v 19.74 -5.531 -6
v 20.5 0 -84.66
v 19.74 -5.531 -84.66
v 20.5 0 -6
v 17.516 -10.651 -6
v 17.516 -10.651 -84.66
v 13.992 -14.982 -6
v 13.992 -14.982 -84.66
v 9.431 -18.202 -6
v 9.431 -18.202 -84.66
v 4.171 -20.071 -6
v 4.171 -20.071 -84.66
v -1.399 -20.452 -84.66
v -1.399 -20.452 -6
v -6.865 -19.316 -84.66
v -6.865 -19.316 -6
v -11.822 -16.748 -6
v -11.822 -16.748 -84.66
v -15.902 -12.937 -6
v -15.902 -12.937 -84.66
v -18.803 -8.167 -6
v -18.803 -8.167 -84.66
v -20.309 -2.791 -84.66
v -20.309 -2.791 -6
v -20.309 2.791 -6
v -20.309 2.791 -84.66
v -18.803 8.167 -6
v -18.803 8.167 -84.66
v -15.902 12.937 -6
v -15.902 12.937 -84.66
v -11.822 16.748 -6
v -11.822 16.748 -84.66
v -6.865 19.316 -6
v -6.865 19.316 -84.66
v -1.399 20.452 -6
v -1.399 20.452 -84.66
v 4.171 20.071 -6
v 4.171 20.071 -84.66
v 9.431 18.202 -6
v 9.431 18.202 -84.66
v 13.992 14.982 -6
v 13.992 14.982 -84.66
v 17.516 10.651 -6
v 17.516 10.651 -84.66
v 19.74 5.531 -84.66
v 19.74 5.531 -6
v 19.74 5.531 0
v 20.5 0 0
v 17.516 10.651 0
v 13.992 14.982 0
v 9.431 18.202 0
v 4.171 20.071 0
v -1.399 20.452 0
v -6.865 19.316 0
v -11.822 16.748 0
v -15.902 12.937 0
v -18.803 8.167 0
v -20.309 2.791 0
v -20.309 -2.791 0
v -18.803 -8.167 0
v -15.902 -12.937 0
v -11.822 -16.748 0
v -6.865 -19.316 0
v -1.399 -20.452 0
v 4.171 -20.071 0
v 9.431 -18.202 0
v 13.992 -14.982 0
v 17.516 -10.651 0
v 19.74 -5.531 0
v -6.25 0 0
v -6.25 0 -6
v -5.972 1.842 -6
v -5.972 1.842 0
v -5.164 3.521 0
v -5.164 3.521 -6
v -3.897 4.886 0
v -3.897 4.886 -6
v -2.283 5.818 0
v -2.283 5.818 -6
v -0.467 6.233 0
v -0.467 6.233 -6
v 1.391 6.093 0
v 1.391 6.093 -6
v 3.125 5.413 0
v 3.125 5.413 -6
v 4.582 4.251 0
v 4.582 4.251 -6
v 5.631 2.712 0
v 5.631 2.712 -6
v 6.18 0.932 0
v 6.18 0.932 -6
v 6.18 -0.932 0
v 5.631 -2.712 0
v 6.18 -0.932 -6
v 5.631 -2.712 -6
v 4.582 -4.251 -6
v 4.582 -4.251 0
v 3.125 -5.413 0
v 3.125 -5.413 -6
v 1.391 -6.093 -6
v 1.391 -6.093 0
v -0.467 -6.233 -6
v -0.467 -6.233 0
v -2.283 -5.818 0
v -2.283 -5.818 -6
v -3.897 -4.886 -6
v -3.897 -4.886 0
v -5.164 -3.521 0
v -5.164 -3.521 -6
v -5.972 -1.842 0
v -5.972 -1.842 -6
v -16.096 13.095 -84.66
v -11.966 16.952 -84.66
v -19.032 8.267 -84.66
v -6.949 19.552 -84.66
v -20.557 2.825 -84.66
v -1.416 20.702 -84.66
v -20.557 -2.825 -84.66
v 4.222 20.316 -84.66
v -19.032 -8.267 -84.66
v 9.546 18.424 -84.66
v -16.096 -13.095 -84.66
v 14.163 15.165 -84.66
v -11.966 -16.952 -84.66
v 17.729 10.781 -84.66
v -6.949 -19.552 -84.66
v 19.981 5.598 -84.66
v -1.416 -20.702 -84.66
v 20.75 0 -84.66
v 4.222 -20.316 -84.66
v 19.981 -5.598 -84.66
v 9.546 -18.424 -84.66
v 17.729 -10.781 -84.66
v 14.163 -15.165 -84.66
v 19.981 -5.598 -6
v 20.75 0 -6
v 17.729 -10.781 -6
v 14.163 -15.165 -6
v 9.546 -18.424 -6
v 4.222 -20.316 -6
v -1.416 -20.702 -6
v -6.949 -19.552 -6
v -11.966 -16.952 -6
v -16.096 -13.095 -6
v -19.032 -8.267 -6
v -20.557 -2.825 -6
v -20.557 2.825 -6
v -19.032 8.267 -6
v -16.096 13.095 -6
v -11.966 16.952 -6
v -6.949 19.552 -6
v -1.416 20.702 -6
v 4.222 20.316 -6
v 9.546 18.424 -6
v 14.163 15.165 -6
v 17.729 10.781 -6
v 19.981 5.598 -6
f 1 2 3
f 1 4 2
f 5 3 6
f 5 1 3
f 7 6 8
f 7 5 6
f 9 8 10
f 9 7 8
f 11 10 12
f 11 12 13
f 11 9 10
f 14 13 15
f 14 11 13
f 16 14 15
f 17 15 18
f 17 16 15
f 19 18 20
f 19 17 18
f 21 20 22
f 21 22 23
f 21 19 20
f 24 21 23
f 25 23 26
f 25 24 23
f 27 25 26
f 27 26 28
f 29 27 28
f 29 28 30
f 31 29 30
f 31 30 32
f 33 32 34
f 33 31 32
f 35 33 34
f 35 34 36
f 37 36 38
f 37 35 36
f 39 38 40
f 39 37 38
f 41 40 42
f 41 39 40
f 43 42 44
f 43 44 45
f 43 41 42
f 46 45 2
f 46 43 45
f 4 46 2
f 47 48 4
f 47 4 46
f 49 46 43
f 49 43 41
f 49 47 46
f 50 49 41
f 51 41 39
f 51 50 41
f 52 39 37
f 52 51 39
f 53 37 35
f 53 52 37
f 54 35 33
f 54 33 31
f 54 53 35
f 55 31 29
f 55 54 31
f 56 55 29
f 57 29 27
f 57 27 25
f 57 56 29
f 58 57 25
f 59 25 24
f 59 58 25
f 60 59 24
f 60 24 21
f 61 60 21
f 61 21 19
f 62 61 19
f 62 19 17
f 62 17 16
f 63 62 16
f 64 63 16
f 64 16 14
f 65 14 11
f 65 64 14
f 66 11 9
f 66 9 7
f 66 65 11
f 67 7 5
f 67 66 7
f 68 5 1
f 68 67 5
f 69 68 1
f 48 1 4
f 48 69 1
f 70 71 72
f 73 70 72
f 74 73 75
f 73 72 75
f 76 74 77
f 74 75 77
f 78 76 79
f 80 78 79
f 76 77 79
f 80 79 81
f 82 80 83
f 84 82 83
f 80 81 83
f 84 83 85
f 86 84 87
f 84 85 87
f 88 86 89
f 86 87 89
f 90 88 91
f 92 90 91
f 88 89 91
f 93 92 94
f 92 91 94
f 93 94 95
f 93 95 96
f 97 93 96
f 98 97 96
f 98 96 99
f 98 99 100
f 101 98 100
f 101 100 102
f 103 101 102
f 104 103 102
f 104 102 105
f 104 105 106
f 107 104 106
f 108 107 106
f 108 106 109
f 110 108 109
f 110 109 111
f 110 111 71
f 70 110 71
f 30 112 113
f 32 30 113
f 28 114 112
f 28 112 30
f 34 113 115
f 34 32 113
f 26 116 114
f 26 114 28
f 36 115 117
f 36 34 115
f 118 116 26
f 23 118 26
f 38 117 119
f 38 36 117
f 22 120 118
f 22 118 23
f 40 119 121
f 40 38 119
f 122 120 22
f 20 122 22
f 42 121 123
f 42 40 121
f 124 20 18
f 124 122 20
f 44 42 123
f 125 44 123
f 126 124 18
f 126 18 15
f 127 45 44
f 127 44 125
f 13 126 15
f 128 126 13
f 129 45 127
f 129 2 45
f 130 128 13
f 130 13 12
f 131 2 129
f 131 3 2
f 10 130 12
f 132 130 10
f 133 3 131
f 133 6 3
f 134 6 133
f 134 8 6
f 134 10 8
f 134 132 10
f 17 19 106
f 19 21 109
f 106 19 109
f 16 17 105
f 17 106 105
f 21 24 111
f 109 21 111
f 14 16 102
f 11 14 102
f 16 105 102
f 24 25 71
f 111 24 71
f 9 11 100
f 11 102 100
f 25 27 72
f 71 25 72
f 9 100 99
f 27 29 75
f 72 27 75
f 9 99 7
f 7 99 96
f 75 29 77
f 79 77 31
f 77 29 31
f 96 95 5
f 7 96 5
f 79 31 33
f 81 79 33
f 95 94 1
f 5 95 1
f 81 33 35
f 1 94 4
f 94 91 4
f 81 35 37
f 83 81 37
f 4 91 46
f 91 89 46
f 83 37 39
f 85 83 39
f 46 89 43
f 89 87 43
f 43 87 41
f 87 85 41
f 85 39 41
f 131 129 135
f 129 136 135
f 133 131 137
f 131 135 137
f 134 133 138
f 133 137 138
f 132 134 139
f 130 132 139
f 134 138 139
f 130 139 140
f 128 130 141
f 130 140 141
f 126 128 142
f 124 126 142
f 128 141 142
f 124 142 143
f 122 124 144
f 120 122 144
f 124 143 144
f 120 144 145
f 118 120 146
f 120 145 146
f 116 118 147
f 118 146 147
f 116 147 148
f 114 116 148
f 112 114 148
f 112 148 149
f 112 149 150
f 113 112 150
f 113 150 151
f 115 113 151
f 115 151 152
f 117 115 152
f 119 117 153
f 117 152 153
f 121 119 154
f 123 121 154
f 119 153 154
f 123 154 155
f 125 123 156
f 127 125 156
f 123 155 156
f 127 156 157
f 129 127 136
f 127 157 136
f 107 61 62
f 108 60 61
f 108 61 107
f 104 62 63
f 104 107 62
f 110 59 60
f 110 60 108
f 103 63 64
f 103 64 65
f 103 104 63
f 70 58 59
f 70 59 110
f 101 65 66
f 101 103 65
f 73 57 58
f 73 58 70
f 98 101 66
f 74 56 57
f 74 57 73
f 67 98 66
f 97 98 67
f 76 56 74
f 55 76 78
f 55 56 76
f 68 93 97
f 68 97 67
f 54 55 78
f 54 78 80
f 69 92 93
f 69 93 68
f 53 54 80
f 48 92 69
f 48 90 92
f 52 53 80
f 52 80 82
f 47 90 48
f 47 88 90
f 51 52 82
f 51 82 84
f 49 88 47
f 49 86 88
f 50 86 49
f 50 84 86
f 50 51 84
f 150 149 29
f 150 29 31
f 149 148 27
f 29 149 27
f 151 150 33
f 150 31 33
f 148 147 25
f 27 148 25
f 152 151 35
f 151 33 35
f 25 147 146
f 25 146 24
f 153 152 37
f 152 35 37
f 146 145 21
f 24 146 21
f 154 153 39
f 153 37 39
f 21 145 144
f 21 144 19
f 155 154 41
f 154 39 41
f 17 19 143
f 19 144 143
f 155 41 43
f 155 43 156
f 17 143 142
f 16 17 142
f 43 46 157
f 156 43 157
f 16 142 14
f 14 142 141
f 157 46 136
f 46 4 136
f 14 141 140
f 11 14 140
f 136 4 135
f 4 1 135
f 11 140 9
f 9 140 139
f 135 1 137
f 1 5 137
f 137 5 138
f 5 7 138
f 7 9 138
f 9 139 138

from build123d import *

# Parameters (mm, degrees)
F0_R     = 20.5
F1_DEPTH = 6
F2_R     = 20.75
F2_R_2   = 20.5
F3_DEPTH = 38.66
F5_DEPTH = 40
F6_D     = 12.5


with BuildPart() as f1:
    # F0 (on Top) → F1 (new body)
    with BuildSketch(Plane.XY):
        Circle(F0_R)
    extrude(amount=-F1_DEPTH)

    # F6 (through all)
    with Locations(Plane.XY):
        with Locations((0, 0)):
            Hole(F6_D / 2)


with BuildPart() as f3:
    # F2 (on face) → F3 (new body)
    with BuildSketch(Plane(origin=(0, 0, -6), x_dir=(1, 0, 0), z_dir=(0, 0, -1))):
        Circle(F2_R)
        Circle(F2_R_2, mode=Mode.SUBTRACT)
    extrude(amount=F3_DEPTH)

    # F5 (add): a face of the model
    f5_faces = [f3.faces().sort_by_distance(p)[0] for p in [
        (-20.6913101372, 0, -44.66),
    ]]
    extrude(f5_faces, amount=F5_DEPTH)


solid = Compound([f1.part, f3.part])
